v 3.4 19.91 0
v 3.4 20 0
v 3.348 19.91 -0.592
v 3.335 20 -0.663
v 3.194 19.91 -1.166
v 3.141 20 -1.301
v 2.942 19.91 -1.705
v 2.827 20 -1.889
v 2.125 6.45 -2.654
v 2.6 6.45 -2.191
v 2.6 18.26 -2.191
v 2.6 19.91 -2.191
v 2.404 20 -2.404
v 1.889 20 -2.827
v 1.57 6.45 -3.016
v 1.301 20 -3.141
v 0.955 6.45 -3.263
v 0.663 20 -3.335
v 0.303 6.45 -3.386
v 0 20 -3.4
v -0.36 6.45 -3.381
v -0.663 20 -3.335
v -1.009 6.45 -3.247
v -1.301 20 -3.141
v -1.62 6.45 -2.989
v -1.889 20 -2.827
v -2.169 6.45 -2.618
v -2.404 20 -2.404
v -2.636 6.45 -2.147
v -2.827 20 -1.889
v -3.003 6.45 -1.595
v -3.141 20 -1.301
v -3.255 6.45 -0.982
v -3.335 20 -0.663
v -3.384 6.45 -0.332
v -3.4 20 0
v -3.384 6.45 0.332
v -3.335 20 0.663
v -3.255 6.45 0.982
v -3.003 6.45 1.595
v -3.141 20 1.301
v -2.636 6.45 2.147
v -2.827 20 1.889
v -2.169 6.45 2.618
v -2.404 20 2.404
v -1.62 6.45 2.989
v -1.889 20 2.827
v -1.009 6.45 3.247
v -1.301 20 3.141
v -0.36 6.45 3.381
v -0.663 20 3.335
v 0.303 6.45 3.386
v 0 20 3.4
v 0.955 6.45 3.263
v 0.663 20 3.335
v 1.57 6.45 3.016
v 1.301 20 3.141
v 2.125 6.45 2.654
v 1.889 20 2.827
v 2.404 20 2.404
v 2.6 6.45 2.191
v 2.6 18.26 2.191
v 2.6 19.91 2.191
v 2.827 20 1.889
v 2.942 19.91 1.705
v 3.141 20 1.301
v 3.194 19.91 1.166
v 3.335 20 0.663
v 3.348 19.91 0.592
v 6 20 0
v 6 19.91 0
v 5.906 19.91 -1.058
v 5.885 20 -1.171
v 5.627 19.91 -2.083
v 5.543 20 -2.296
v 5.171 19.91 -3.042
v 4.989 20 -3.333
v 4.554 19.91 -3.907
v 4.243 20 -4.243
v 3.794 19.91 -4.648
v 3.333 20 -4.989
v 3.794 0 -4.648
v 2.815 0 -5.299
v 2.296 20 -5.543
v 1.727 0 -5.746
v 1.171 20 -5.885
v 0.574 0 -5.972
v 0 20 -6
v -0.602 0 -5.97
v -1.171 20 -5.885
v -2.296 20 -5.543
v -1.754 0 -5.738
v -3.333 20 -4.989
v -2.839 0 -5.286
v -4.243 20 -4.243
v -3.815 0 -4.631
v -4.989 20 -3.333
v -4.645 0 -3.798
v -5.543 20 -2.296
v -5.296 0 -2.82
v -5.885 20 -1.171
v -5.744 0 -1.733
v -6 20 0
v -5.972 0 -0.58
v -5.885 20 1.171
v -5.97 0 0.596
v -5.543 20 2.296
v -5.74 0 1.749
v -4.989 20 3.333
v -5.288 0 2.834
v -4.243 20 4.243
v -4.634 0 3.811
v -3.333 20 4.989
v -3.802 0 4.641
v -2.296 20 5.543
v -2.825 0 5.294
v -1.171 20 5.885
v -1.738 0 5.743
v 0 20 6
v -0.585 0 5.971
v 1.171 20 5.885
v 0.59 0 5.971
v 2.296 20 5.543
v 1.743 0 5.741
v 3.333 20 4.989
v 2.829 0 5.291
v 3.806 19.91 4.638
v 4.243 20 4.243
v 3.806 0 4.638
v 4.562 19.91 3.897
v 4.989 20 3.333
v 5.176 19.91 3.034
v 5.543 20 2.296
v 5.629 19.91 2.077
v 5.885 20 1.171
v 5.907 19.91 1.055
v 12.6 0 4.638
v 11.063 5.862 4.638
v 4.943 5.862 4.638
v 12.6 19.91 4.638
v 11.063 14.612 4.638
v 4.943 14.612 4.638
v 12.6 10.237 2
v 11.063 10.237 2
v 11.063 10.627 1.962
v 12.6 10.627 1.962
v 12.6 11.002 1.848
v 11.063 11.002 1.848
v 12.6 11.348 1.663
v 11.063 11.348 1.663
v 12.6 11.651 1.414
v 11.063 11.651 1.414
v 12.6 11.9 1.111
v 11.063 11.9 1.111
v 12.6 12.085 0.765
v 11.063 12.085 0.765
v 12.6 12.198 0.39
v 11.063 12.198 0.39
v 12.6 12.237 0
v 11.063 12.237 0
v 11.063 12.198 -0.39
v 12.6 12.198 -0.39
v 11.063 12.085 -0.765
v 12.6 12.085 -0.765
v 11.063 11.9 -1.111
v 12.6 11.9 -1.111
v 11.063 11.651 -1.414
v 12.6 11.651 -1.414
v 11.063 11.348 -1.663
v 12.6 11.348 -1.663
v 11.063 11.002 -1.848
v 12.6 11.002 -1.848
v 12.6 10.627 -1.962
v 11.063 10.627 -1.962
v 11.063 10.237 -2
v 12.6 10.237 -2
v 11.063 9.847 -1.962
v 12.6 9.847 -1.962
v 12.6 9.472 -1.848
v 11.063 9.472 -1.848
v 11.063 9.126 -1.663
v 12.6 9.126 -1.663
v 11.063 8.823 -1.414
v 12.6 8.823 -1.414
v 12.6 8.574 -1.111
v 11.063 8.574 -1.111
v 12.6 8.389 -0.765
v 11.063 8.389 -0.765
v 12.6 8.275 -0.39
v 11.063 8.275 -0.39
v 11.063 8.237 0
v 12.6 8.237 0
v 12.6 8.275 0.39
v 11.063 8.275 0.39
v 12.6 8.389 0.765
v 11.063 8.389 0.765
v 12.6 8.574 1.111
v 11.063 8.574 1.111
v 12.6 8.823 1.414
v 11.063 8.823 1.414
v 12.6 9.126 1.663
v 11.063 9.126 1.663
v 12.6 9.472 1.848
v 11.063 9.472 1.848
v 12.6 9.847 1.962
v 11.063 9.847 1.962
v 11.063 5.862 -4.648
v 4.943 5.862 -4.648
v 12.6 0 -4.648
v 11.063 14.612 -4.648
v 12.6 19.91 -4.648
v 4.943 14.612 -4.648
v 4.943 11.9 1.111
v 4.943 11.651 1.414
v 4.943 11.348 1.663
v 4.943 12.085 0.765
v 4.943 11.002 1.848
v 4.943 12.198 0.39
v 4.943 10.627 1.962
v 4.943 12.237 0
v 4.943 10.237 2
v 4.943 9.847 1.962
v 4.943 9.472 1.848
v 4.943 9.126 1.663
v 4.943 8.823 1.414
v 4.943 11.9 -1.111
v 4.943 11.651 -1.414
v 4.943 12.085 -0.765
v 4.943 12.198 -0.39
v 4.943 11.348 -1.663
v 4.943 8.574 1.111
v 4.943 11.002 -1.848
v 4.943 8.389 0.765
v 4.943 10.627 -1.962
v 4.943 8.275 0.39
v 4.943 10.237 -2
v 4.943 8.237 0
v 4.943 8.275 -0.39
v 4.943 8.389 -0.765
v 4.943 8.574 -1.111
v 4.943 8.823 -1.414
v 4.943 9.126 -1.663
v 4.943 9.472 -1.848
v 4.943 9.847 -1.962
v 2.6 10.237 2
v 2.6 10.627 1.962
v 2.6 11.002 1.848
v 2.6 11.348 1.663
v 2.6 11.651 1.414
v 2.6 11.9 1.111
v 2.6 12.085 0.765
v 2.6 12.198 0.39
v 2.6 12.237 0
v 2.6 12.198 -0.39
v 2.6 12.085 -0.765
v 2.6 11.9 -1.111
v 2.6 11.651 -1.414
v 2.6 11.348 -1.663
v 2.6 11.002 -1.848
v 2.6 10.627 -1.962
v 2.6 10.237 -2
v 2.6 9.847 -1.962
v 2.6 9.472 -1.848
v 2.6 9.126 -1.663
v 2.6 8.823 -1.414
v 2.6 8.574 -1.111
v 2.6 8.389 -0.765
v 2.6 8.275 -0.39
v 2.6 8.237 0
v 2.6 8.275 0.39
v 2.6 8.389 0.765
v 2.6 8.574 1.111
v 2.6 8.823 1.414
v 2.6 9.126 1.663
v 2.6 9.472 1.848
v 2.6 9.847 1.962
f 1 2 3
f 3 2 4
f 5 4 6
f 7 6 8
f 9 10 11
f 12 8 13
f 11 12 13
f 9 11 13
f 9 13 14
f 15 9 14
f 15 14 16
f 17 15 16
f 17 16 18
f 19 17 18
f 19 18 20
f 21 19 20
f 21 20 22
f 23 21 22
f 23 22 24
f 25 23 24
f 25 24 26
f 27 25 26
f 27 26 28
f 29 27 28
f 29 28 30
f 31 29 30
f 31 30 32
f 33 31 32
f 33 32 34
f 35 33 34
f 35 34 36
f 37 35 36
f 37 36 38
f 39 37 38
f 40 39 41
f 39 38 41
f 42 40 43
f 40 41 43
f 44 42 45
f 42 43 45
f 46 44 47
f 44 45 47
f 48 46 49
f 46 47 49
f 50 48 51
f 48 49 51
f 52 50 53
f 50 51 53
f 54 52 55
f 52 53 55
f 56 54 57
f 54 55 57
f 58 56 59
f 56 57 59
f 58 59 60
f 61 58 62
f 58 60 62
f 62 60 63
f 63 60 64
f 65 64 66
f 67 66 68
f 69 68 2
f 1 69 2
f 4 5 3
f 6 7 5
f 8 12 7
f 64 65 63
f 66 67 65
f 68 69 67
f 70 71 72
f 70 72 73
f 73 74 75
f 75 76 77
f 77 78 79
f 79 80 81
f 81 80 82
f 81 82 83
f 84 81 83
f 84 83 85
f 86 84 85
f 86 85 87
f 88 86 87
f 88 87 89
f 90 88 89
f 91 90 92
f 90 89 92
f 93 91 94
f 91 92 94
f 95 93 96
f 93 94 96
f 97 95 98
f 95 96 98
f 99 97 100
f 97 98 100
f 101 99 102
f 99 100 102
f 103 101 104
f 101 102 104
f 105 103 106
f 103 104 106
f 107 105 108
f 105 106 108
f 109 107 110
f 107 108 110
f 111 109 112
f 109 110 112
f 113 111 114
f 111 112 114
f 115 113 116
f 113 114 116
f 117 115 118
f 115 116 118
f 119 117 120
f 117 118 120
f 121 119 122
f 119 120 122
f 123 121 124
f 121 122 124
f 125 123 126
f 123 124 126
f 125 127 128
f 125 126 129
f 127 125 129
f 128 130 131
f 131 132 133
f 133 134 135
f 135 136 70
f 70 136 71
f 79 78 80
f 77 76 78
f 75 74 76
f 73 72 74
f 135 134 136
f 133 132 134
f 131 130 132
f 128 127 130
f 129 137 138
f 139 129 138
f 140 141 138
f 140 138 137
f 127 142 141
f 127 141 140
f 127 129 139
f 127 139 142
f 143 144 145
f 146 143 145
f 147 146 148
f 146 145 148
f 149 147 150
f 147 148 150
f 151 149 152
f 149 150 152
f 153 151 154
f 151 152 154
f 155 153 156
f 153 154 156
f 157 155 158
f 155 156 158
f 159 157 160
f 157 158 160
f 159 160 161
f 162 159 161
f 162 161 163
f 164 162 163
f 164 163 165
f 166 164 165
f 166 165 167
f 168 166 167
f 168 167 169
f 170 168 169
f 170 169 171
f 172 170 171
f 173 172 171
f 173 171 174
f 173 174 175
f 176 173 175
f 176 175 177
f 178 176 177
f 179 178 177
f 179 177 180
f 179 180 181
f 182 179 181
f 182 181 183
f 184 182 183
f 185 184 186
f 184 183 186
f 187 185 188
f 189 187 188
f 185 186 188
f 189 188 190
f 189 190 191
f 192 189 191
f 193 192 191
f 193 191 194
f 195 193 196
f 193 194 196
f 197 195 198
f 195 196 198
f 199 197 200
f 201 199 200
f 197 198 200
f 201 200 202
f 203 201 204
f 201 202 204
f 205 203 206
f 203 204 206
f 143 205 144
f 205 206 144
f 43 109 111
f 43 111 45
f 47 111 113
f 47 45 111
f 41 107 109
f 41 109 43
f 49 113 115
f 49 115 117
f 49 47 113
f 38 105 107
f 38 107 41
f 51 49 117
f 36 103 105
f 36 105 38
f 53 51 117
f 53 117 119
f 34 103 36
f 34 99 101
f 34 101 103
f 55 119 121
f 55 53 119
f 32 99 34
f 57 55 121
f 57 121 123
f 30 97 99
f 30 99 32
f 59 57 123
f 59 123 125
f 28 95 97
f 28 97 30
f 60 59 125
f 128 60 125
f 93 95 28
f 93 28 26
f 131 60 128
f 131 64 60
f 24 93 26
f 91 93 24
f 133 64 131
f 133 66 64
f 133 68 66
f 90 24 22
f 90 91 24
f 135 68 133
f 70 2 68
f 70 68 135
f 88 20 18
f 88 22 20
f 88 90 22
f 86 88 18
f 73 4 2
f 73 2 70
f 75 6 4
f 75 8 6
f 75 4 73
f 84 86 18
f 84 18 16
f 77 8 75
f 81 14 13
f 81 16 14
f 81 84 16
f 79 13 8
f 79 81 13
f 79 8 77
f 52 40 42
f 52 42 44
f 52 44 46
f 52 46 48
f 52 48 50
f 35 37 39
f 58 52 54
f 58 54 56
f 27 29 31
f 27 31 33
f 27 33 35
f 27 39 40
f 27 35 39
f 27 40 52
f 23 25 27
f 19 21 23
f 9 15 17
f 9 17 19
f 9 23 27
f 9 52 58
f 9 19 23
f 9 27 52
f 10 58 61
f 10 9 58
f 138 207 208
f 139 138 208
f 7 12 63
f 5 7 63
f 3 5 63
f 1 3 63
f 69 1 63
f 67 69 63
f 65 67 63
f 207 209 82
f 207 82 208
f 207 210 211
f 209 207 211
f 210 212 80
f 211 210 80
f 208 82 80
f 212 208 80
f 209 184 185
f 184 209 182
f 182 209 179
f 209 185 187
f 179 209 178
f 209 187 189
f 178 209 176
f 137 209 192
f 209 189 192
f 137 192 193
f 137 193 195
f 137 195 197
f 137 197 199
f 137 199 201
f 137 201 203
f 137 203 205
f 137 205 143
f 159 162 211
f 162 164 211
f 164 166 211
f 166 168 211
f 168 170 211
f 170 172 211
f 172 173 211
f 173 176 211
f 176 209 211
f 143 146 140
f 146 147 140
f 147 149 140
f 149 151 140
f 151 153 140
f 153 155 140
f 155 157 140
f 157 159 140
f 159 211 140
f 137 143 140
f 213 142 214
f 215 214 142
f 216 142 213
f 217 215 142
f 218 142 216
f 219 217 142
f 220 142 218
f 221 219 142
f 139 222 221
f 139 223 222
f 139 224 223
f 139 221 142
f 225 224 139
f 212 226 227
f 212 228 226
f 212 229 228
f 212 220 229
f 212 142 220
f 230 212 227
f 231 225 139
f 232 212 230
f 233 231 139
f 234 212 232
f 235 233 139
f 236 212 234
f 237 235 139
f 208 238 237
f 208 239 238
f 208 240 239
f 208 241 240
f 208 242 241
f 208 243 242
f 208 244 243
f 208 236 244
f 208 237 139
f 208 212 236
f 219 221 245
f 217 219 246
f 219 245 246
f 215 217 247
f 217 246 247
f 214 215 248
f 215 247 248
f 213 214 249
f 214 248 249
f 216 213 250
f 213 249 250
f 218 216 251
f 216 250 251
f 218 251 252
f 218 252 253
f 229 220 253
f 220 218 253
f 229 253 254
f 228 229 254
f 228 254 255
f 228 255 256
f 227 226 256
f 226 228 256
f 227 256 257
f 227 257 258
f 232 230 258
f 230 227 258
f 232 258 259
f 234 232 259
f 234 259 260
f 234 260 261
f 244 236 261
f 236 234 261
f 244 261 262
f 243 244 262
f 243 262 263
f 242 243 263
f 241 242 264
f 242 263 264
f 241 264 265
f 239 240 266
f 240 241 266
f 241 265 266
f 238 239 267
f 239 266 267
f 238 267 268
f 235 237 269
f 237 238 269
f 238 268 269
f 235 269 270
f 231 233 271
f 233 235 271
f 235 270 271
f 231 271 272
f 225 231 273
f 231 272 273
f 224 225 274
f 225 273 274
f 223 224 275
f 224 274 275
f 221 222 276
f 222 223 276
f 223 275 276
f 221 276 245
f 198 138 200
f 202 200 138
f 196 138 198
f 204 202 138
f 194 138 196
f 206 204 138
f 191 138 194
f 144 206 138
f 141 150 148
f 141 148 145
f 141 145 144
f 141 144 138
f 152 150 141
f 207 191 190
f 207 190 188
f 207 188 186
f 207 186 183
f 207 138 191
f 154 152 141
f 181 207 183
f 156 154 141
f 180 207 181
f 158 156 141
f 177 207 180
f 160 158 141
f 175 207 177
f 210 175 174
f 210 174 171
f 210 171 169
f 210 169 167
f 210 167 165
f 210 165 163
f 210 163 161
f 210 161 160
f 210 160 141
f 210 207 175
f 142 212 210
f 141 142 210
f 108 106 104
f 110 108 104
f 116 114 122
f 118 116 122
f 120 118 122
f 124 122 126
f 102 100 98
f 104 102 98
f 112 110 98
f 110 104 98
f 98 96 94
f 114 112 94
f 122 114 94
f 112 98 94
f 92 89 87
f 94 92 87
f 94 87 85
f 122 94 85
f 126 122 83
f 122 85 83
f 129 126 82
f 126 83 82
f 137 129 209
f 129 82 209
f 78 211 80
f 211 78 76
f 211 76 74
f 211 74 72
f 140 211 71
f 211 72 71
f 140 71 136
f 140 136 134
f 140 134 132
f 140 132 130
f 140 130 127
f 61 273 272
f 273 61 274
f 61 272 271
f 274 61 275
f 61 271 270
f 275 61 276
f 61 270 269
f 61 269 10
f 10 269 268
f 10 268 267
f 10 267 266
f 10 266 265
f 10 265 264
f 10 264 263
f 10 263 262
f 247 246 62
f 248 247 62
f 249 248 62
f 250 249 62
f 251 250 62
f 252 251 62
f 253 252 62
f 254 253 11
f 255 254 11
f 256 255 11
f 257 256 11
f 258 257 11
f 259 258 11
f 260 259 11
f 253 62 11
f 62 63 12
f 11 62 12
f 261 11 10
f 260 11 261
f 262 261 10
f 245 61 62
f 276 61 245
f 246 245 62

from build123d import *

# Parameters (mm, degrees)
SKETCH1_R               = 6
BOSS_EXTRUDE1_DEPTH     = 20
SKETCH2_R               = 3.4
CUT_EXTRUDE1_DEPTH      = 13.55
SKETCH5_W               = 1.550685087
SKETCH5_H               = 7.184215806
BOSS_EXTRUDE2_DEPTH     = 13.55
SKETCH7_W               = 9.286501956
SKETCH7_H               = 19.909960041
BOSS_EXTRUDE3_DEPTH     = 10
CUT_EXTRUDE2_DEPTH      = 1
CUT_EXTRUDE2_DEPTH_BACK = 13.55
SKETCH6_R               = 2
CUT_EXTRUDE3_DEPTH      = 10
CUT_EXTRUDE3_DEPTH_BACK = 10


with BuildPart() as part:
    # Sketch1 → Boss-Extrude1 (new body)
    with BuildSketch(Plane(origin=(0, 0, 0), x_dir=(1, 0, 0), z_dir=(0, 1, 0))):
        Circle(SKETCH1_R)
    extrude(amount=BOSS_EXTRUDE1_DEPTH)

    # Sketch2 → Cut-Extrude1 (cut)
    with BuildSketch(Plane(origin=(0, 20, 0), x_dir=(1, 0, 0), z_dir=(0, 1, 0))):
        Circle(SKETCH2_R)
    extrude(amount=-CUT_EXTRUDE1_DEPTH, mode=Mode.SUBTRACT)

    # Sketch5 → Boss-Extrude2 (add)
    with BuildSketch(Plane(origin=(0, 18.26, 0), x_dir=(1, 0, 0), z_dir=(0, 1, 0))):
        with Locations((3.375342544, 0.020519704)):
            Rectangle(SKETCH5_W, SKETCH5_H)
    extrude(amount=-BOSS_EXTRUDE2_DEPTH)

    # Sketch7 → Boss-Extrude3 (add)
    with BuildSketch(Plane.ZY.offset(-2.6)):
        with Locations((-0.005218197, 9.954980021)):
            Rectangle(SKETCH7_W, SKETCH7_H)
    extrude(amount=-BOSS_EXTRUDE3_DEPTH)

    # Sketch6 → Cut-Extrude2 (cut, two sides: drawn at the far end of the back side and taken through both)
    with BuildSketch(Plane.ZY.offset(-2.6).offset(-CUT_EXTRUDE2_DEPTH_BACK)):
        with Locations((0, 10.236925537)):
            Circle(SKETCH6_R)
    extrude(amount=CUT_EXTRUDE2_DEPTH + CUT_EXTRUDE2_DEPTH_BACK, mode=Mode.SUBTRACT)

    # Sketch9 → Cut-Extrude3 (cut, two sides: drawn at the far end of the back side and taken through both)
    with BuildSketch(Plane.XY.offset(-CUT_EXTRUDE3_DEPTH_BACK)):
        Polygon((11.063430227, 10.236925537), (11.063430227, 5.861925537), (4.943430227, 5.861925537), (4.943430227, 10.236925537), (4.943430227, 14.611925537), (11.063430227, 14.611925537), align=None)
    extrude(amount=CUT_EXTRUDE3_DEPTH + CUT_EXTRUDE3_DEPTH_BACK, mode=Mode.SUBTRACT)


solid = part.part
